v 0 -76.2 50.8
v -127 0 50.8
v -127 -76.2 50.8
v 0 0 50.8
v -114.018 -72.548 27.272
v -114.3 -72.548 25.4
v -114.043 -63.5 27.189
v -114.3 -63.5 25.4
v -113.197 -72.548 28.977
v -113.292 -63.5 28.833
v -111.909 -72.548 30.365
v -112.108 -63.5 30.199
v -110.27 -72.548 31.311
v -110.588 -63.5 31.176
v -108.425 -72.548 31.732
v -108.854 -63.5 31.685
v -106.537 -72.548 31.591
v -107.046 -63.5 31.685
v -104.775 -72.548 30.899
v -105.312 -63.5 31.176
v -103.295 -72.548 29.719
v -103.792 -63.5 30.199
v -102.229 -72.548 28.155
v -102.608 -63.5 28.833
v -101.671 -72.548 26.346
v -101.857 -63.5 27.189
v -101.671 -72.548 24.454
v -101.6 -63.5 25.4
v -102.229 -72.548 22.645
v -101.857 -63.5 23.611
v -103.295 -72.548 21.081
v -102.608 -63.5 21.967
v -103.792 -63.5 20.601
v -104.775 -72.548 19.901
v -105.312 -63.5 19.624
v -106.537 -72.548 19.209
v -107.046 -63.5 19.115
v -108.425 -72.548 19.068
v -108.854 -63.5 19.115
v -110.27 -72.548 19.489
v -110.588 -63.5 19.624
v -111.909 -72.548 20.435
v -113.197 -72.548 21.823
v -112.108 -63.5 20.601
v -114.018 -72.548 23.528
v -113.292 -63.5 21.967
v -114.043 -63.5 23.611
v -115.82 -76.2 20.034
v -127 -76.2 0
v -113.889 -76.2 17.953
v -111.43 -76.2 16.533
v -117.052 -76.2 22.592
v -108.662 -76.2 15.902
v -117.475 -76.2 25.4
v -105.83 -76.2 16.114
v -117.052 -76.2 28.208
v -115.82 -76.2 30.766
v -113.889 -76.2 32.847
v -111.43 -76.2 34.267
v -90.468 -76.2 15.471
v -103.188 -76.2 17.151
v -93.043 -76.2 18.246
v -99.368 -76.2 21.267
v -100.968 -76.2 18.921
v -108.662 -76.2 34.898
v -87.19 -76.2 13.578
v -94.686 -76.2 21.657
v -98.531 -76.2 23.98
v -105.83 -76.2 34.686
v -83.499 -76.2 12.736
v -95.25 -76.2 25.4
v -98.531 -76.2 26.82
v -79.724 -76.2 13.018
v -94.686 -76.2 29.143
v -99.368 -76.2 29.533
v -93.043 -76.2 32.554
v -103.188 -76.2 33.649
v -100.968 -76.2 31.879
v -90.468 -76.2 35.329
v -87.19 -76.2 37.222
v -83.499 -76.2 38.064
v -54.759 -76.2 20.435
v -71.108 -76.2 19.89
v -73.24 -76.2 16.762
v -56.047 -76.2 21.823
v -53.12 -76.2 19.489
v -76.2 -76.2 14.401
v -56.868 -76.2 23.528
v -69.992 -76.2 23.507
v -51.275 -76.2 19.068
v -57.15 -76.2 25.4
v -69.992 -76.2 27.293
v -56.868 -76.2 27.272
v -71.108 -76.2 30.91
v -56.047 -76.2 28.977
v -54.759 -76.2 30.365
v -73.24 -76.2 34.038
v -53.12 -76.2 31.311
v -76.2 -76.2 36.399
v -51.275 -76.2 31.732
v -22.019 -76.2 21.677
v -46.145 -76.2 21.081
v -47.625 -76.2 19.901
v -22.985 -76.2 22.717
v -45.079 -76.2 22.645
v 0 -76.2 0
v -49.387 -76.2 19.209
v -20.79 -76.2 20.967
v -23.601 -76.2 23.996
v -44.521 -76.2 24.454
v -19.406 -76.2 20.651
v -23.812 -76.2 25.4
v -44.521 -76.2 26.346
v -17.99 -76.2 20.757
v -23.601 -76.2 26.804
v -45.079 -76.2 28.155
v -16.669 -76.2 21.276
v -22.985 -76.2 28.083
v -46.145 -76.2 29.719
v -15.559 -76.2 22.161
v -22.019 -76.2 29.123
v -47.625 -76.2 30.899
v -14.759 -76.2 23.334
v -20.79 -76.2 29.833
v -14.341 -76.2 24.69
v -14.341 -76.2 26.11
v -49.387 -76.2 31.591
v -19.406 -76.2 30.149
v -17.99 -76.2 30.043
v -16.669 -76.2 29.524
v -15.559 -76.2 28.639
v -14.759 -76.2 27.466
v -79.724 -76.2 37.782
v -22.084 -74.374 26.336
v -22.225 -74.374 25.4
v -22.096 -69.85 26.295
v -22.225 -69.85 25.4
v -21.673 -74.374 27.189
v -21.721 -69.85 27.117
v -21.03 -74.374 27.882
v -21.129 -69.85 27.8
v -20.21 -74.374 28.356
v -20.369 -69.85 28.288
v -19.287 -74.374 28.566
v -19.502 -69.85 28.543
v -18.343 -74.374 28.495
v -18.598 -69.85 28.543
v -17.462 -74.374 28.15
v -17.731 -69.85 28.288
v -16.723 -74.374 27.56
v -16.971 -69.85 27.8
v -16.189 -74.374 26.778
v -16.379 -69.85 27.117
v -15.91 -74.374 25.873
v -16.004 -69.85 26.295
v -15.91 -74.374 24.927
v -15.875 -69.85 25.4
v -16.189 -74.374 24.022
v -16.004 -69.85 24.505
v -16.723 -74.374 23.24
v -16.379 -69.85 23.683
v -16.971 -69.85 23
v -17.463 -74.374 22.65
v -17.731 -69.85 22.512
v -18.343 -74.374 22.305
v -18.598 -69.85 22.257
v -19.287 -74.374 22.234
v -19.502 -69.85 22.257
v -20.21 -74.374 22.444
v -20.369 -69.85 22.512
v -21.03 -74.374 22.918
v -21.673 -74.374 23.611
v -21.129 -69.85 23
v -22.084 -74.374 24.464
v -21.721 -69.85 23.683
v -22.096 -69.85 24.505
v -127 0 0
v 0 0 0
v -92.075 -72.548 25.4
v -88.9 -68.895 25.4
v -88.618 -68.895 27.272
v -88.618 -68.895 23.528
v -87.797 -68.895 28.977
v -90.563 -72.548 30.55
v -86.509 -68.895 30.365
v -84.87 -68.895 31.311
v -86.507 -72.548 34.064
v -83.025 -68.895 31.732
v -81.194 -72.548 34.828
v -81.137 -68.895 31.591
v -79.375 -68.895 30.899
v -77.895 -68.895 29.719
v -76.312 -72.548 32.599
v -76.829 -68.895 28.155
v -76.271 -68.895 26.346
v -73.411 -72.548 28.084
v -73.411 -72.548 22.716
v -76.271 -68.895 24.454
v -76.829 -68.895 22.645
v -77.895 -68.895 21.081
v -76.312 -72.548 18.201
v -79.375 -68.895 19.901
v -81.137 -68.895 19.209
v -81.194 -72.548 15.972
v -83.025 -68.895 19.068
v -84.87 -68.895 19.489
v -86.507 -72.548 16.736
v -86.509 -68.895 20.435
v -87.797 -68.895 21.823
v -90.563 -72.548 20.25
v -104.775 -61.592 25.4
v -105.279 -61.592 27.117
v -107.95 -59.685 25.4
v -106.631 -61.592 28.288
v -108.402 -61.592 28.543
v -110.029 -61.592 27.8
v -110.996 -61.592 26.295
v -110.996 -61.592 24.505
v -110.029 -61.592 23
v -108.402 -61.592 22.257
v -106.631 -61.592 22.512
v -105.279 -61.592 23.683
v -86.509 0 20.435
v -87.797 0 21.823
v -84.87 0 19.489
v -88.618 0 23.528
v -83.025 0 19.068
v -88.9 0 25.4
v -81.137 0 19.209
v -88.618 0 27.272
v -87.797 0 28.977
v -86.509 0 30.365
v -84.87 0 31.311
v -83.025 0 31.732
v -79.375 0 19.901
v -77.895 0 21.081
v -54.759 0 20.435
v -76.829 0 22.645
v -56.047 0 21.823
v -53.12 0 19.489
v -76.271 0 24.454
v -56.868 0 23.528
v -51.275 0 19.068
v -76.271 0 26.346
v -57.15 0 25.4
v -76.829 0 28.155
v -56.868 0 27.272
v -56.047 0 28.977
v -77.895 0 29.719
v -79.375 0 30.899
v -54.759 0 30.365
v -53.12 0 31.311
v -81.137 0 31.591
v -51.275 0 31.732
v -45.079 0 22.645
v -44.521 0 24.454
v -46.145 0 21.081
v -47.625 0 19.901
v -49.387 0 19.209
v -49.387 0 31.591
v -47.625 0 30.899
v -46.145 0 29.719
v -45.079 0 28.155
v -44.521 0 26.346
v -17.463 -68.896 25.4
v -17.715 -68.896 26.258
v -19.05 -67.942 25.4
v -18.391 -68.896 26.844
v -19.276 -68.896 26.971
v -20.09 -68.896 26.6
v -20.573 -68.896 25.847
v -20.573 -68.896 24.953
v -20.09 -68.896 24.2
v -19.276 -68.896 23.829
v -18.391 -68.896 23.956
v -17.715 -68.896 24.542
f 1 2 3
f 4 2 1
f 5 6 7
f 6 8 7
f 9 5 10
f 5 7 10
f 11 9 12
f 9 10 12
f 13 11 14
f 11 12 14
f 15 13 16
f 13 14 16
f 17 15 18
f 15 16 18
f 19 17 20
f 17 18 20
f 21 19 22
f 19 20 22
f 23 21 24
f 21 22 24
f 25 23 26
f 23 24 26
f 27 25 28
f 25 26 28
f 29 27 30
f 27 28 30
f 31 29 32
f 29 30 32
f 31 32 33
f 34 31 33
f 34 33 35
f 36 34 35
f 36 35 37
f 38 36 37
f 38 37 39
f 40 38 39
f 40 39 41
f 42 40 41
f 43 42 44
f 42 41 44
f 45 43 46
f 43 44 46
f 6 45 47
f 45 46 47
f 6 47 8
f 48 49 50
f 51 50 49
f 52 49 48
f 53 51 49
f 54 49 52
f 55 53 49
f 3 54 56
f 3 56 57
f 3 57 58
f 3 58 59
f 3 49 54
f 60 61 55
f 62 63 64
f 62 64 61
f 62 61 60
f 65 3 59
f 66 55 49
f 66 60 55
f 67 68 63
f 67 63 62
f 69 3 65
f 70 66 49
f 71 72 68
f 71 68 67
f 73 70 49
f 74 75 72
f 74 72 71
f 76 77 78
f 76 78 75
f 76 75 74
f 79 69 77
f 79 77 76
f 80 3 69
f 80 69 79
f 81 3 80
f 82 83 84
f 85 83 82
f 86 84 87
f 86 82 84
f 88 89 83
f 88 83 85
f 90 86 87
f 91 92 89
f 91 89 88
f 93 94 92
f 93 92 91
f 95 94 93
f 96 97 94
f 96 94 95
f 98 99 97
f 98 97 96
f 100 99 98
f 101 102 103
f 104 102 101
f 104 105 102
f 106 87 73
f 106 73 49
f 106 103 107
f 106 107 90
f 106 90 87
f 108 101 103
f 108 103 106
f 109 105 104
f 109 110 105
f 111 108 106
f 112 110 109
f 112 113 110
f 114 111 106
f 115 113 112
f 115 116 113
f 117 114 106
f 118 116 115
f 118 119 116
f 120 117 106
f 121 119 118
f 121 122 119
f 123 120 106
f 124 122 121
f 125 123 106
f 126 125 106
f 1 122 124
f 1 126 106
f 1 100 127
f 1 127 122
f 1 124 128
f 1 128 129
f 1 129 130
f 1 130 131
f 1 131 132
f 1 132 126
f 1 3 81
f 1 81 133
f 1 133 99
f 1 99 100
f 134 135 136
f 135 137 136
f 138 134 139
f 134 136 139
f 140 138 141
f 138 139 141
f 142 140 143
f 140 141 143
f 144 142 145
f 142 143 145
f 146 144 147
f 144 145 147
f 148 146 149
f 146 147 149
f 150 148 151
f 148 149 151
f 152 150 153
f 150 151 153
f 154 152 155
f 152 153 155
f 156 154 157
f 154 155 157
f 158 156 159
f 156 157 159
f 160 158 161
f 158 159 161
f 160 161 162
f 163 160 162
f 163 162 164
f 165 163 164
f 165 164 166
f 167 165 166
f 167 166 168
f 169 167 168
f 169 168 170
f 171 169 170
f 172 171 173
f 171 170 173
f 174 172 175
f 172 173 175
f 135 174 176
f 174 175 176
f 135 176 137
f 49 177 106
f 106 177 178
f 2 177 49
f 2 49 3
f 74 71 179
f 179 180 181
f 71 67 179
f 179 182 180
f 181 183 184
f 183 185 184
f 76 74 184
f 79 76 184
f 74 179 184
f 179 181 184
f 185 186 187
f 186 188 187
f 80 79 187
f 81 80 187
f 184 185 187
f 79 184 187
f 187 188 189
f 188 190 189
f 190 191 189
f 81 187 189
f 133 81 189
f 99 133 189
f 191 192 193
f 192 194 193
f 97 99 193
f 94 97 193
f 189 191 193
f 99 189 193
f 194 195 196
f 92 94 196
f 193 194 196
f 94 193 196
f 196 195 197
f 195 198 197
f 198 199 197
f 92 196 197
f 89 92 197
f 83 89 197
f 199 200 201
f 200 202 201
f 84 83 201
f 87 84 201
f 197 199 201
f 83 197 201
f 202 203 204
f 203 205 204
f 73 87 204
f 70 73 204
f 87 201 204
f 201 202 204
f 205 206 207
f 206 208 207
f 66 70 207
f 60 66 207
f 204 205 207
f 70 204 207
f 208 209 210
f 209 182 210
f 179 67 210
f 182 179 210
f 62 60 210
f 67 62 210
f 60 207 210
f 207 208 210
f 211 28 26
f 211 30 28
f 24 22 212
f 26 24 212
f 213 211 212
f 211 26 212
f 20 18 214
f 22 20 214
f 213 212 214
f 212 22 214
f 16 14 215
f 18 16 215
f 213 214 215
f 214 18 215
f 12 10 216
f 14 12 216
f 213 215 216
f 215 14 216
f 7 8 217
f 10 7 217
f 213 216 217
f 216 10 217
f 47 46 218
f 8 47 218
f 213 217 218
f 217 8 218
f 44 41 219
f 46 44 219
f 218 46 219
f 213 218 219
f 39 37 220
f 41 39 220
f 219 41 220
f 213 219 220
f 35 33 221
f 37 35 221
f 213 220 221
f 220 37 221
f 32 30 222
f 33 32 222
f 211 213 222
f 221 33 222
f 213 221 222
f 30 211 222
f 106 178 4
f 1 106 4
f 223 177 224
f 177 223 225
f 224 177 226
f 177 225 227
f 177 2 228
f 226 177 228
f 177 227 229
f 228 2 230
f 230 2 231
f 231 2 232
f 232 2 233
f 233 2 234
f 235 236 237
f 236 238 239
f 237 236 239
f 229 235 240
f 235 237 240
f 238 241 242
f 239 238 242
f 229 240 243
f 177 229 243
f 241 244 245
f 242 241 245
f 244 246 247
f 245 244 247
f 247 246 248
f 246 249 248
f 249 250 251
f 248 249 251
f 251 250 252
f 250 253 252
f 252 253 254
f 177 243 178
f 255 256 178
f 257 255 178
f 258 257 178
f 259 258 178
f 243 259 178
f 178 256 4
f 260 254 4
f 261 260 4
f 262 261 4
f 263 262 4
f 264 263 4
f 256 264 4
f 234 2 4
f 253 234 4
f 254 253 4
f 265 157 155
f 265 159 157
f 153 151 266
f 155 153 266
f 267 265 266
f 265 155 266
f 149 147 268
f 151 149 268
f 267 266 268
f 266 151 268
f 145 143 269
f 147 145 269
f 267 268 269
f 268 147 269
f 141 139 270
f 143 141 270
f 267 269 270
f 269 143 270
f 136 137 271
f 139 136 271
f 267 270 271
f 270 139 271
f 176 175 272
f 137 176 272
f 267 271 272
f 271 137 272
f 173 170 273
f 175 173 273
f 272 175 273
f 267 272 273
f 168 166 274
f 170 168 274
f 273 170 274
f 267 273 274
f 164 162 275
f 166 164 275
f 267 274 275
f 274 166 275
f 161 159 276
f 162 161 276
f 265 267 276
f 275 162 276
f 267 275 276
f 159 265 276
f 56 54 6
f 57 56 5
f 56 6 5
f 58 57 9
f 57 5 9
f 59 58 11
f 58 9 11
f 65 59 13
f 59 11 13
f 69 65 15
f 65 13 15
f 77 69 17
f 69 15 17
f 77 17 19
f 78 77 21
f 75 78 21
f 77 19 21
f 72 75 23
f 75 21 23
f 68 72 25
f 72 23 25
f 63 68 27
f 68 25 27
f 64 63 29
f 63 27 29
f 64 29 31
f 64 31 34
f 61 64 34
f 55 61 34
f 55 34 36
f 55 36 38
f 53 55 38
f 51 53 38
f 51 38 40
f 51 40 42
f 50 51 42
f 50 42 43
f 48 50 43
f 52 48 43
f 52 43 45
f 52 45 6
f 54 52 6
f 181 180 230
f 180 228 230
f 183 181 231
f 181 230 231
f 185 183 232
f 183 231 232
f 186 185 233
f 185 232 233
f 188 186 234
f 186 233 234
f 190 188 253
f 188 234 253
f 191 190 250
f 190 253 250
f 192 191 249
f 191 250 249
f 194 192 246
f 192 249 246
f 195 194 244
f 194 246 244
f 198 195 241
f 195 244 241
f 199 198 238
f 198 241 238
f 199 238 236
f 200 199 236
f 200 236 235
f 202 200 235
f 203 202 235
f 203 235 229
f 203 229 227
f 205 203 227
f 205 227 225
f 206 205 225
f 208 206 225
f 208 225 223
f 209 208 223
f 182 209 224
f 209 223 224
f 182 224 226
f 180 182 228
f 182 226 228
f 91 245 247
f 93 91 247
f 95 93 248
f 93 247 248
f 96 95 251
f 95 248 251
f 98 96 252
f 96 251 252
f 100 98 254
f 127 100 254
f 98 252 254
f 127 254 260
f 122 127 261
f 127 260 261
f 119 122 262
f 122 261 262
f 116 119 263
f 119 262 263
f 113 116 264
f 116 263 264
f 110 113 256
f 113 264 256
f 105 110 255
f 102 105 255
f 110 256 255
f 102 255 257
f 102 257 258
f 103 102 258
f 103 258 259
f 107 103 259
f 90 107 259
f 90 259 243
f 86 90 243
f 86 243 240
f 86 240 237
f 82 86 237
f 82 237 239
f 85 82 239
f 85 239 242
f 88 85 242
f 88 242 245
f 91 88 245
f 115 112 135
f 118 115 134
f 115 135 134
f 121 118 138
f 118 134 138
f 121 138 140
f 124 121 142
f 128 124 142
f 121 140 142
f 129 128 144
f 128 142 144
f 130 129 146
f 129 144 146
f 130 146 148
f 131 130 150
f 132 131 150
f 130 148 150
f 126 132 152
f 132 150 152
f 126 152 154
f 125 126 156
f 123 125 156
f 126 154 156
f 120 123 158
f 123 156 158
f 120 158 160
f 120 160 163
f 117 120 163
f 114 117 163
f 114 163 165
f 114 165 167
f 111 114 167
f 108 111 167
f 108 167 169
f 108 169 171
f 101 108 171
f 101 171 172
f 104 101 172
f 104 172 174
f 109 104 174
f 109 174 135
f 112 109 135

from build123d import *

# Parameters (mm, degrees)
F0_W           = 127
F0_H           = 50.8
F1_DEPTH       = 76.2
F3_D           = 12.7
F3_DEPTH       = 12.7
F3_CSINK_D     = 19.05
F3_CSINK_ANGLE = 82
F3_TIP         = 3.8154649308
F4_D           = 12.7
F4_CSINK_D     = 25.4
F4_CSINK_ANGLE = 82
F5_D           = 12.7
F6_D           = 6.35
F6_DEPTH       = 6.35
F6_CSINK_D     = 9.525
F6_CSINK_ANGLE = 82
F6_TIP         = 1.9077324654


with BuildPart() as f1:
    # F0 (on Front) → F1 (new body)
    with BuildSketch(Plane.XZ):
        with Locations((-63.5, 25.4)):
            Rectangle(F0_W, F0_H)
    extrude(amount=F1_DEPTH)

    # F3
    with Locations(Plane.XZ.offset(76.2)):
        with Locations((-107.95, 25.4)):
            CounterSinkHole(F3_D / 2, F3_CSINK_D / 2, depth=F3_DEPTH, counter_sink_angle=F3_CSINK_ANGLE)
            with Locations((0, 0, -(F3_DEPTH + F3_TIP / 2))):  # 118° drill point
                Cone(0, F3_D / 2, F3_TIP, mode=Mode.SUBTRACT)

    # F4 (through all)
    with Locations(Plane.XZ.offset(76.2)):
        with Locations((-82.55, 25.4)):
            CounterSinkHole(F4_D / 2, F4_CSINK_D / 2, counter_sink_angle=F4_CSINK_ANGLE)

    # F5 (through all)
    with Locations(Plane.XZ.offset(76.2)):
        with Locations((-50.8, 25.4)):
            Hole(F5_D / 2)

    # F6
    with Locations(Plane.XZ.offset(76.2)):
        with Locations((-19.05, 25.4)):
            CounterSinkHole(F6_D / 2, F6_CSINK_D / 2, depth=F6_DEPTH, counter_sink_angle=F6_CSINK_ANGLE)
            with Locations((0, 0, -(F6_DEPTH + F6_TIP / 2))):  # 118° drill point
                Cone(0, F6_D / 2, F6_TIP, mode=Mode.SUBTRACT)


solid = f1.part
